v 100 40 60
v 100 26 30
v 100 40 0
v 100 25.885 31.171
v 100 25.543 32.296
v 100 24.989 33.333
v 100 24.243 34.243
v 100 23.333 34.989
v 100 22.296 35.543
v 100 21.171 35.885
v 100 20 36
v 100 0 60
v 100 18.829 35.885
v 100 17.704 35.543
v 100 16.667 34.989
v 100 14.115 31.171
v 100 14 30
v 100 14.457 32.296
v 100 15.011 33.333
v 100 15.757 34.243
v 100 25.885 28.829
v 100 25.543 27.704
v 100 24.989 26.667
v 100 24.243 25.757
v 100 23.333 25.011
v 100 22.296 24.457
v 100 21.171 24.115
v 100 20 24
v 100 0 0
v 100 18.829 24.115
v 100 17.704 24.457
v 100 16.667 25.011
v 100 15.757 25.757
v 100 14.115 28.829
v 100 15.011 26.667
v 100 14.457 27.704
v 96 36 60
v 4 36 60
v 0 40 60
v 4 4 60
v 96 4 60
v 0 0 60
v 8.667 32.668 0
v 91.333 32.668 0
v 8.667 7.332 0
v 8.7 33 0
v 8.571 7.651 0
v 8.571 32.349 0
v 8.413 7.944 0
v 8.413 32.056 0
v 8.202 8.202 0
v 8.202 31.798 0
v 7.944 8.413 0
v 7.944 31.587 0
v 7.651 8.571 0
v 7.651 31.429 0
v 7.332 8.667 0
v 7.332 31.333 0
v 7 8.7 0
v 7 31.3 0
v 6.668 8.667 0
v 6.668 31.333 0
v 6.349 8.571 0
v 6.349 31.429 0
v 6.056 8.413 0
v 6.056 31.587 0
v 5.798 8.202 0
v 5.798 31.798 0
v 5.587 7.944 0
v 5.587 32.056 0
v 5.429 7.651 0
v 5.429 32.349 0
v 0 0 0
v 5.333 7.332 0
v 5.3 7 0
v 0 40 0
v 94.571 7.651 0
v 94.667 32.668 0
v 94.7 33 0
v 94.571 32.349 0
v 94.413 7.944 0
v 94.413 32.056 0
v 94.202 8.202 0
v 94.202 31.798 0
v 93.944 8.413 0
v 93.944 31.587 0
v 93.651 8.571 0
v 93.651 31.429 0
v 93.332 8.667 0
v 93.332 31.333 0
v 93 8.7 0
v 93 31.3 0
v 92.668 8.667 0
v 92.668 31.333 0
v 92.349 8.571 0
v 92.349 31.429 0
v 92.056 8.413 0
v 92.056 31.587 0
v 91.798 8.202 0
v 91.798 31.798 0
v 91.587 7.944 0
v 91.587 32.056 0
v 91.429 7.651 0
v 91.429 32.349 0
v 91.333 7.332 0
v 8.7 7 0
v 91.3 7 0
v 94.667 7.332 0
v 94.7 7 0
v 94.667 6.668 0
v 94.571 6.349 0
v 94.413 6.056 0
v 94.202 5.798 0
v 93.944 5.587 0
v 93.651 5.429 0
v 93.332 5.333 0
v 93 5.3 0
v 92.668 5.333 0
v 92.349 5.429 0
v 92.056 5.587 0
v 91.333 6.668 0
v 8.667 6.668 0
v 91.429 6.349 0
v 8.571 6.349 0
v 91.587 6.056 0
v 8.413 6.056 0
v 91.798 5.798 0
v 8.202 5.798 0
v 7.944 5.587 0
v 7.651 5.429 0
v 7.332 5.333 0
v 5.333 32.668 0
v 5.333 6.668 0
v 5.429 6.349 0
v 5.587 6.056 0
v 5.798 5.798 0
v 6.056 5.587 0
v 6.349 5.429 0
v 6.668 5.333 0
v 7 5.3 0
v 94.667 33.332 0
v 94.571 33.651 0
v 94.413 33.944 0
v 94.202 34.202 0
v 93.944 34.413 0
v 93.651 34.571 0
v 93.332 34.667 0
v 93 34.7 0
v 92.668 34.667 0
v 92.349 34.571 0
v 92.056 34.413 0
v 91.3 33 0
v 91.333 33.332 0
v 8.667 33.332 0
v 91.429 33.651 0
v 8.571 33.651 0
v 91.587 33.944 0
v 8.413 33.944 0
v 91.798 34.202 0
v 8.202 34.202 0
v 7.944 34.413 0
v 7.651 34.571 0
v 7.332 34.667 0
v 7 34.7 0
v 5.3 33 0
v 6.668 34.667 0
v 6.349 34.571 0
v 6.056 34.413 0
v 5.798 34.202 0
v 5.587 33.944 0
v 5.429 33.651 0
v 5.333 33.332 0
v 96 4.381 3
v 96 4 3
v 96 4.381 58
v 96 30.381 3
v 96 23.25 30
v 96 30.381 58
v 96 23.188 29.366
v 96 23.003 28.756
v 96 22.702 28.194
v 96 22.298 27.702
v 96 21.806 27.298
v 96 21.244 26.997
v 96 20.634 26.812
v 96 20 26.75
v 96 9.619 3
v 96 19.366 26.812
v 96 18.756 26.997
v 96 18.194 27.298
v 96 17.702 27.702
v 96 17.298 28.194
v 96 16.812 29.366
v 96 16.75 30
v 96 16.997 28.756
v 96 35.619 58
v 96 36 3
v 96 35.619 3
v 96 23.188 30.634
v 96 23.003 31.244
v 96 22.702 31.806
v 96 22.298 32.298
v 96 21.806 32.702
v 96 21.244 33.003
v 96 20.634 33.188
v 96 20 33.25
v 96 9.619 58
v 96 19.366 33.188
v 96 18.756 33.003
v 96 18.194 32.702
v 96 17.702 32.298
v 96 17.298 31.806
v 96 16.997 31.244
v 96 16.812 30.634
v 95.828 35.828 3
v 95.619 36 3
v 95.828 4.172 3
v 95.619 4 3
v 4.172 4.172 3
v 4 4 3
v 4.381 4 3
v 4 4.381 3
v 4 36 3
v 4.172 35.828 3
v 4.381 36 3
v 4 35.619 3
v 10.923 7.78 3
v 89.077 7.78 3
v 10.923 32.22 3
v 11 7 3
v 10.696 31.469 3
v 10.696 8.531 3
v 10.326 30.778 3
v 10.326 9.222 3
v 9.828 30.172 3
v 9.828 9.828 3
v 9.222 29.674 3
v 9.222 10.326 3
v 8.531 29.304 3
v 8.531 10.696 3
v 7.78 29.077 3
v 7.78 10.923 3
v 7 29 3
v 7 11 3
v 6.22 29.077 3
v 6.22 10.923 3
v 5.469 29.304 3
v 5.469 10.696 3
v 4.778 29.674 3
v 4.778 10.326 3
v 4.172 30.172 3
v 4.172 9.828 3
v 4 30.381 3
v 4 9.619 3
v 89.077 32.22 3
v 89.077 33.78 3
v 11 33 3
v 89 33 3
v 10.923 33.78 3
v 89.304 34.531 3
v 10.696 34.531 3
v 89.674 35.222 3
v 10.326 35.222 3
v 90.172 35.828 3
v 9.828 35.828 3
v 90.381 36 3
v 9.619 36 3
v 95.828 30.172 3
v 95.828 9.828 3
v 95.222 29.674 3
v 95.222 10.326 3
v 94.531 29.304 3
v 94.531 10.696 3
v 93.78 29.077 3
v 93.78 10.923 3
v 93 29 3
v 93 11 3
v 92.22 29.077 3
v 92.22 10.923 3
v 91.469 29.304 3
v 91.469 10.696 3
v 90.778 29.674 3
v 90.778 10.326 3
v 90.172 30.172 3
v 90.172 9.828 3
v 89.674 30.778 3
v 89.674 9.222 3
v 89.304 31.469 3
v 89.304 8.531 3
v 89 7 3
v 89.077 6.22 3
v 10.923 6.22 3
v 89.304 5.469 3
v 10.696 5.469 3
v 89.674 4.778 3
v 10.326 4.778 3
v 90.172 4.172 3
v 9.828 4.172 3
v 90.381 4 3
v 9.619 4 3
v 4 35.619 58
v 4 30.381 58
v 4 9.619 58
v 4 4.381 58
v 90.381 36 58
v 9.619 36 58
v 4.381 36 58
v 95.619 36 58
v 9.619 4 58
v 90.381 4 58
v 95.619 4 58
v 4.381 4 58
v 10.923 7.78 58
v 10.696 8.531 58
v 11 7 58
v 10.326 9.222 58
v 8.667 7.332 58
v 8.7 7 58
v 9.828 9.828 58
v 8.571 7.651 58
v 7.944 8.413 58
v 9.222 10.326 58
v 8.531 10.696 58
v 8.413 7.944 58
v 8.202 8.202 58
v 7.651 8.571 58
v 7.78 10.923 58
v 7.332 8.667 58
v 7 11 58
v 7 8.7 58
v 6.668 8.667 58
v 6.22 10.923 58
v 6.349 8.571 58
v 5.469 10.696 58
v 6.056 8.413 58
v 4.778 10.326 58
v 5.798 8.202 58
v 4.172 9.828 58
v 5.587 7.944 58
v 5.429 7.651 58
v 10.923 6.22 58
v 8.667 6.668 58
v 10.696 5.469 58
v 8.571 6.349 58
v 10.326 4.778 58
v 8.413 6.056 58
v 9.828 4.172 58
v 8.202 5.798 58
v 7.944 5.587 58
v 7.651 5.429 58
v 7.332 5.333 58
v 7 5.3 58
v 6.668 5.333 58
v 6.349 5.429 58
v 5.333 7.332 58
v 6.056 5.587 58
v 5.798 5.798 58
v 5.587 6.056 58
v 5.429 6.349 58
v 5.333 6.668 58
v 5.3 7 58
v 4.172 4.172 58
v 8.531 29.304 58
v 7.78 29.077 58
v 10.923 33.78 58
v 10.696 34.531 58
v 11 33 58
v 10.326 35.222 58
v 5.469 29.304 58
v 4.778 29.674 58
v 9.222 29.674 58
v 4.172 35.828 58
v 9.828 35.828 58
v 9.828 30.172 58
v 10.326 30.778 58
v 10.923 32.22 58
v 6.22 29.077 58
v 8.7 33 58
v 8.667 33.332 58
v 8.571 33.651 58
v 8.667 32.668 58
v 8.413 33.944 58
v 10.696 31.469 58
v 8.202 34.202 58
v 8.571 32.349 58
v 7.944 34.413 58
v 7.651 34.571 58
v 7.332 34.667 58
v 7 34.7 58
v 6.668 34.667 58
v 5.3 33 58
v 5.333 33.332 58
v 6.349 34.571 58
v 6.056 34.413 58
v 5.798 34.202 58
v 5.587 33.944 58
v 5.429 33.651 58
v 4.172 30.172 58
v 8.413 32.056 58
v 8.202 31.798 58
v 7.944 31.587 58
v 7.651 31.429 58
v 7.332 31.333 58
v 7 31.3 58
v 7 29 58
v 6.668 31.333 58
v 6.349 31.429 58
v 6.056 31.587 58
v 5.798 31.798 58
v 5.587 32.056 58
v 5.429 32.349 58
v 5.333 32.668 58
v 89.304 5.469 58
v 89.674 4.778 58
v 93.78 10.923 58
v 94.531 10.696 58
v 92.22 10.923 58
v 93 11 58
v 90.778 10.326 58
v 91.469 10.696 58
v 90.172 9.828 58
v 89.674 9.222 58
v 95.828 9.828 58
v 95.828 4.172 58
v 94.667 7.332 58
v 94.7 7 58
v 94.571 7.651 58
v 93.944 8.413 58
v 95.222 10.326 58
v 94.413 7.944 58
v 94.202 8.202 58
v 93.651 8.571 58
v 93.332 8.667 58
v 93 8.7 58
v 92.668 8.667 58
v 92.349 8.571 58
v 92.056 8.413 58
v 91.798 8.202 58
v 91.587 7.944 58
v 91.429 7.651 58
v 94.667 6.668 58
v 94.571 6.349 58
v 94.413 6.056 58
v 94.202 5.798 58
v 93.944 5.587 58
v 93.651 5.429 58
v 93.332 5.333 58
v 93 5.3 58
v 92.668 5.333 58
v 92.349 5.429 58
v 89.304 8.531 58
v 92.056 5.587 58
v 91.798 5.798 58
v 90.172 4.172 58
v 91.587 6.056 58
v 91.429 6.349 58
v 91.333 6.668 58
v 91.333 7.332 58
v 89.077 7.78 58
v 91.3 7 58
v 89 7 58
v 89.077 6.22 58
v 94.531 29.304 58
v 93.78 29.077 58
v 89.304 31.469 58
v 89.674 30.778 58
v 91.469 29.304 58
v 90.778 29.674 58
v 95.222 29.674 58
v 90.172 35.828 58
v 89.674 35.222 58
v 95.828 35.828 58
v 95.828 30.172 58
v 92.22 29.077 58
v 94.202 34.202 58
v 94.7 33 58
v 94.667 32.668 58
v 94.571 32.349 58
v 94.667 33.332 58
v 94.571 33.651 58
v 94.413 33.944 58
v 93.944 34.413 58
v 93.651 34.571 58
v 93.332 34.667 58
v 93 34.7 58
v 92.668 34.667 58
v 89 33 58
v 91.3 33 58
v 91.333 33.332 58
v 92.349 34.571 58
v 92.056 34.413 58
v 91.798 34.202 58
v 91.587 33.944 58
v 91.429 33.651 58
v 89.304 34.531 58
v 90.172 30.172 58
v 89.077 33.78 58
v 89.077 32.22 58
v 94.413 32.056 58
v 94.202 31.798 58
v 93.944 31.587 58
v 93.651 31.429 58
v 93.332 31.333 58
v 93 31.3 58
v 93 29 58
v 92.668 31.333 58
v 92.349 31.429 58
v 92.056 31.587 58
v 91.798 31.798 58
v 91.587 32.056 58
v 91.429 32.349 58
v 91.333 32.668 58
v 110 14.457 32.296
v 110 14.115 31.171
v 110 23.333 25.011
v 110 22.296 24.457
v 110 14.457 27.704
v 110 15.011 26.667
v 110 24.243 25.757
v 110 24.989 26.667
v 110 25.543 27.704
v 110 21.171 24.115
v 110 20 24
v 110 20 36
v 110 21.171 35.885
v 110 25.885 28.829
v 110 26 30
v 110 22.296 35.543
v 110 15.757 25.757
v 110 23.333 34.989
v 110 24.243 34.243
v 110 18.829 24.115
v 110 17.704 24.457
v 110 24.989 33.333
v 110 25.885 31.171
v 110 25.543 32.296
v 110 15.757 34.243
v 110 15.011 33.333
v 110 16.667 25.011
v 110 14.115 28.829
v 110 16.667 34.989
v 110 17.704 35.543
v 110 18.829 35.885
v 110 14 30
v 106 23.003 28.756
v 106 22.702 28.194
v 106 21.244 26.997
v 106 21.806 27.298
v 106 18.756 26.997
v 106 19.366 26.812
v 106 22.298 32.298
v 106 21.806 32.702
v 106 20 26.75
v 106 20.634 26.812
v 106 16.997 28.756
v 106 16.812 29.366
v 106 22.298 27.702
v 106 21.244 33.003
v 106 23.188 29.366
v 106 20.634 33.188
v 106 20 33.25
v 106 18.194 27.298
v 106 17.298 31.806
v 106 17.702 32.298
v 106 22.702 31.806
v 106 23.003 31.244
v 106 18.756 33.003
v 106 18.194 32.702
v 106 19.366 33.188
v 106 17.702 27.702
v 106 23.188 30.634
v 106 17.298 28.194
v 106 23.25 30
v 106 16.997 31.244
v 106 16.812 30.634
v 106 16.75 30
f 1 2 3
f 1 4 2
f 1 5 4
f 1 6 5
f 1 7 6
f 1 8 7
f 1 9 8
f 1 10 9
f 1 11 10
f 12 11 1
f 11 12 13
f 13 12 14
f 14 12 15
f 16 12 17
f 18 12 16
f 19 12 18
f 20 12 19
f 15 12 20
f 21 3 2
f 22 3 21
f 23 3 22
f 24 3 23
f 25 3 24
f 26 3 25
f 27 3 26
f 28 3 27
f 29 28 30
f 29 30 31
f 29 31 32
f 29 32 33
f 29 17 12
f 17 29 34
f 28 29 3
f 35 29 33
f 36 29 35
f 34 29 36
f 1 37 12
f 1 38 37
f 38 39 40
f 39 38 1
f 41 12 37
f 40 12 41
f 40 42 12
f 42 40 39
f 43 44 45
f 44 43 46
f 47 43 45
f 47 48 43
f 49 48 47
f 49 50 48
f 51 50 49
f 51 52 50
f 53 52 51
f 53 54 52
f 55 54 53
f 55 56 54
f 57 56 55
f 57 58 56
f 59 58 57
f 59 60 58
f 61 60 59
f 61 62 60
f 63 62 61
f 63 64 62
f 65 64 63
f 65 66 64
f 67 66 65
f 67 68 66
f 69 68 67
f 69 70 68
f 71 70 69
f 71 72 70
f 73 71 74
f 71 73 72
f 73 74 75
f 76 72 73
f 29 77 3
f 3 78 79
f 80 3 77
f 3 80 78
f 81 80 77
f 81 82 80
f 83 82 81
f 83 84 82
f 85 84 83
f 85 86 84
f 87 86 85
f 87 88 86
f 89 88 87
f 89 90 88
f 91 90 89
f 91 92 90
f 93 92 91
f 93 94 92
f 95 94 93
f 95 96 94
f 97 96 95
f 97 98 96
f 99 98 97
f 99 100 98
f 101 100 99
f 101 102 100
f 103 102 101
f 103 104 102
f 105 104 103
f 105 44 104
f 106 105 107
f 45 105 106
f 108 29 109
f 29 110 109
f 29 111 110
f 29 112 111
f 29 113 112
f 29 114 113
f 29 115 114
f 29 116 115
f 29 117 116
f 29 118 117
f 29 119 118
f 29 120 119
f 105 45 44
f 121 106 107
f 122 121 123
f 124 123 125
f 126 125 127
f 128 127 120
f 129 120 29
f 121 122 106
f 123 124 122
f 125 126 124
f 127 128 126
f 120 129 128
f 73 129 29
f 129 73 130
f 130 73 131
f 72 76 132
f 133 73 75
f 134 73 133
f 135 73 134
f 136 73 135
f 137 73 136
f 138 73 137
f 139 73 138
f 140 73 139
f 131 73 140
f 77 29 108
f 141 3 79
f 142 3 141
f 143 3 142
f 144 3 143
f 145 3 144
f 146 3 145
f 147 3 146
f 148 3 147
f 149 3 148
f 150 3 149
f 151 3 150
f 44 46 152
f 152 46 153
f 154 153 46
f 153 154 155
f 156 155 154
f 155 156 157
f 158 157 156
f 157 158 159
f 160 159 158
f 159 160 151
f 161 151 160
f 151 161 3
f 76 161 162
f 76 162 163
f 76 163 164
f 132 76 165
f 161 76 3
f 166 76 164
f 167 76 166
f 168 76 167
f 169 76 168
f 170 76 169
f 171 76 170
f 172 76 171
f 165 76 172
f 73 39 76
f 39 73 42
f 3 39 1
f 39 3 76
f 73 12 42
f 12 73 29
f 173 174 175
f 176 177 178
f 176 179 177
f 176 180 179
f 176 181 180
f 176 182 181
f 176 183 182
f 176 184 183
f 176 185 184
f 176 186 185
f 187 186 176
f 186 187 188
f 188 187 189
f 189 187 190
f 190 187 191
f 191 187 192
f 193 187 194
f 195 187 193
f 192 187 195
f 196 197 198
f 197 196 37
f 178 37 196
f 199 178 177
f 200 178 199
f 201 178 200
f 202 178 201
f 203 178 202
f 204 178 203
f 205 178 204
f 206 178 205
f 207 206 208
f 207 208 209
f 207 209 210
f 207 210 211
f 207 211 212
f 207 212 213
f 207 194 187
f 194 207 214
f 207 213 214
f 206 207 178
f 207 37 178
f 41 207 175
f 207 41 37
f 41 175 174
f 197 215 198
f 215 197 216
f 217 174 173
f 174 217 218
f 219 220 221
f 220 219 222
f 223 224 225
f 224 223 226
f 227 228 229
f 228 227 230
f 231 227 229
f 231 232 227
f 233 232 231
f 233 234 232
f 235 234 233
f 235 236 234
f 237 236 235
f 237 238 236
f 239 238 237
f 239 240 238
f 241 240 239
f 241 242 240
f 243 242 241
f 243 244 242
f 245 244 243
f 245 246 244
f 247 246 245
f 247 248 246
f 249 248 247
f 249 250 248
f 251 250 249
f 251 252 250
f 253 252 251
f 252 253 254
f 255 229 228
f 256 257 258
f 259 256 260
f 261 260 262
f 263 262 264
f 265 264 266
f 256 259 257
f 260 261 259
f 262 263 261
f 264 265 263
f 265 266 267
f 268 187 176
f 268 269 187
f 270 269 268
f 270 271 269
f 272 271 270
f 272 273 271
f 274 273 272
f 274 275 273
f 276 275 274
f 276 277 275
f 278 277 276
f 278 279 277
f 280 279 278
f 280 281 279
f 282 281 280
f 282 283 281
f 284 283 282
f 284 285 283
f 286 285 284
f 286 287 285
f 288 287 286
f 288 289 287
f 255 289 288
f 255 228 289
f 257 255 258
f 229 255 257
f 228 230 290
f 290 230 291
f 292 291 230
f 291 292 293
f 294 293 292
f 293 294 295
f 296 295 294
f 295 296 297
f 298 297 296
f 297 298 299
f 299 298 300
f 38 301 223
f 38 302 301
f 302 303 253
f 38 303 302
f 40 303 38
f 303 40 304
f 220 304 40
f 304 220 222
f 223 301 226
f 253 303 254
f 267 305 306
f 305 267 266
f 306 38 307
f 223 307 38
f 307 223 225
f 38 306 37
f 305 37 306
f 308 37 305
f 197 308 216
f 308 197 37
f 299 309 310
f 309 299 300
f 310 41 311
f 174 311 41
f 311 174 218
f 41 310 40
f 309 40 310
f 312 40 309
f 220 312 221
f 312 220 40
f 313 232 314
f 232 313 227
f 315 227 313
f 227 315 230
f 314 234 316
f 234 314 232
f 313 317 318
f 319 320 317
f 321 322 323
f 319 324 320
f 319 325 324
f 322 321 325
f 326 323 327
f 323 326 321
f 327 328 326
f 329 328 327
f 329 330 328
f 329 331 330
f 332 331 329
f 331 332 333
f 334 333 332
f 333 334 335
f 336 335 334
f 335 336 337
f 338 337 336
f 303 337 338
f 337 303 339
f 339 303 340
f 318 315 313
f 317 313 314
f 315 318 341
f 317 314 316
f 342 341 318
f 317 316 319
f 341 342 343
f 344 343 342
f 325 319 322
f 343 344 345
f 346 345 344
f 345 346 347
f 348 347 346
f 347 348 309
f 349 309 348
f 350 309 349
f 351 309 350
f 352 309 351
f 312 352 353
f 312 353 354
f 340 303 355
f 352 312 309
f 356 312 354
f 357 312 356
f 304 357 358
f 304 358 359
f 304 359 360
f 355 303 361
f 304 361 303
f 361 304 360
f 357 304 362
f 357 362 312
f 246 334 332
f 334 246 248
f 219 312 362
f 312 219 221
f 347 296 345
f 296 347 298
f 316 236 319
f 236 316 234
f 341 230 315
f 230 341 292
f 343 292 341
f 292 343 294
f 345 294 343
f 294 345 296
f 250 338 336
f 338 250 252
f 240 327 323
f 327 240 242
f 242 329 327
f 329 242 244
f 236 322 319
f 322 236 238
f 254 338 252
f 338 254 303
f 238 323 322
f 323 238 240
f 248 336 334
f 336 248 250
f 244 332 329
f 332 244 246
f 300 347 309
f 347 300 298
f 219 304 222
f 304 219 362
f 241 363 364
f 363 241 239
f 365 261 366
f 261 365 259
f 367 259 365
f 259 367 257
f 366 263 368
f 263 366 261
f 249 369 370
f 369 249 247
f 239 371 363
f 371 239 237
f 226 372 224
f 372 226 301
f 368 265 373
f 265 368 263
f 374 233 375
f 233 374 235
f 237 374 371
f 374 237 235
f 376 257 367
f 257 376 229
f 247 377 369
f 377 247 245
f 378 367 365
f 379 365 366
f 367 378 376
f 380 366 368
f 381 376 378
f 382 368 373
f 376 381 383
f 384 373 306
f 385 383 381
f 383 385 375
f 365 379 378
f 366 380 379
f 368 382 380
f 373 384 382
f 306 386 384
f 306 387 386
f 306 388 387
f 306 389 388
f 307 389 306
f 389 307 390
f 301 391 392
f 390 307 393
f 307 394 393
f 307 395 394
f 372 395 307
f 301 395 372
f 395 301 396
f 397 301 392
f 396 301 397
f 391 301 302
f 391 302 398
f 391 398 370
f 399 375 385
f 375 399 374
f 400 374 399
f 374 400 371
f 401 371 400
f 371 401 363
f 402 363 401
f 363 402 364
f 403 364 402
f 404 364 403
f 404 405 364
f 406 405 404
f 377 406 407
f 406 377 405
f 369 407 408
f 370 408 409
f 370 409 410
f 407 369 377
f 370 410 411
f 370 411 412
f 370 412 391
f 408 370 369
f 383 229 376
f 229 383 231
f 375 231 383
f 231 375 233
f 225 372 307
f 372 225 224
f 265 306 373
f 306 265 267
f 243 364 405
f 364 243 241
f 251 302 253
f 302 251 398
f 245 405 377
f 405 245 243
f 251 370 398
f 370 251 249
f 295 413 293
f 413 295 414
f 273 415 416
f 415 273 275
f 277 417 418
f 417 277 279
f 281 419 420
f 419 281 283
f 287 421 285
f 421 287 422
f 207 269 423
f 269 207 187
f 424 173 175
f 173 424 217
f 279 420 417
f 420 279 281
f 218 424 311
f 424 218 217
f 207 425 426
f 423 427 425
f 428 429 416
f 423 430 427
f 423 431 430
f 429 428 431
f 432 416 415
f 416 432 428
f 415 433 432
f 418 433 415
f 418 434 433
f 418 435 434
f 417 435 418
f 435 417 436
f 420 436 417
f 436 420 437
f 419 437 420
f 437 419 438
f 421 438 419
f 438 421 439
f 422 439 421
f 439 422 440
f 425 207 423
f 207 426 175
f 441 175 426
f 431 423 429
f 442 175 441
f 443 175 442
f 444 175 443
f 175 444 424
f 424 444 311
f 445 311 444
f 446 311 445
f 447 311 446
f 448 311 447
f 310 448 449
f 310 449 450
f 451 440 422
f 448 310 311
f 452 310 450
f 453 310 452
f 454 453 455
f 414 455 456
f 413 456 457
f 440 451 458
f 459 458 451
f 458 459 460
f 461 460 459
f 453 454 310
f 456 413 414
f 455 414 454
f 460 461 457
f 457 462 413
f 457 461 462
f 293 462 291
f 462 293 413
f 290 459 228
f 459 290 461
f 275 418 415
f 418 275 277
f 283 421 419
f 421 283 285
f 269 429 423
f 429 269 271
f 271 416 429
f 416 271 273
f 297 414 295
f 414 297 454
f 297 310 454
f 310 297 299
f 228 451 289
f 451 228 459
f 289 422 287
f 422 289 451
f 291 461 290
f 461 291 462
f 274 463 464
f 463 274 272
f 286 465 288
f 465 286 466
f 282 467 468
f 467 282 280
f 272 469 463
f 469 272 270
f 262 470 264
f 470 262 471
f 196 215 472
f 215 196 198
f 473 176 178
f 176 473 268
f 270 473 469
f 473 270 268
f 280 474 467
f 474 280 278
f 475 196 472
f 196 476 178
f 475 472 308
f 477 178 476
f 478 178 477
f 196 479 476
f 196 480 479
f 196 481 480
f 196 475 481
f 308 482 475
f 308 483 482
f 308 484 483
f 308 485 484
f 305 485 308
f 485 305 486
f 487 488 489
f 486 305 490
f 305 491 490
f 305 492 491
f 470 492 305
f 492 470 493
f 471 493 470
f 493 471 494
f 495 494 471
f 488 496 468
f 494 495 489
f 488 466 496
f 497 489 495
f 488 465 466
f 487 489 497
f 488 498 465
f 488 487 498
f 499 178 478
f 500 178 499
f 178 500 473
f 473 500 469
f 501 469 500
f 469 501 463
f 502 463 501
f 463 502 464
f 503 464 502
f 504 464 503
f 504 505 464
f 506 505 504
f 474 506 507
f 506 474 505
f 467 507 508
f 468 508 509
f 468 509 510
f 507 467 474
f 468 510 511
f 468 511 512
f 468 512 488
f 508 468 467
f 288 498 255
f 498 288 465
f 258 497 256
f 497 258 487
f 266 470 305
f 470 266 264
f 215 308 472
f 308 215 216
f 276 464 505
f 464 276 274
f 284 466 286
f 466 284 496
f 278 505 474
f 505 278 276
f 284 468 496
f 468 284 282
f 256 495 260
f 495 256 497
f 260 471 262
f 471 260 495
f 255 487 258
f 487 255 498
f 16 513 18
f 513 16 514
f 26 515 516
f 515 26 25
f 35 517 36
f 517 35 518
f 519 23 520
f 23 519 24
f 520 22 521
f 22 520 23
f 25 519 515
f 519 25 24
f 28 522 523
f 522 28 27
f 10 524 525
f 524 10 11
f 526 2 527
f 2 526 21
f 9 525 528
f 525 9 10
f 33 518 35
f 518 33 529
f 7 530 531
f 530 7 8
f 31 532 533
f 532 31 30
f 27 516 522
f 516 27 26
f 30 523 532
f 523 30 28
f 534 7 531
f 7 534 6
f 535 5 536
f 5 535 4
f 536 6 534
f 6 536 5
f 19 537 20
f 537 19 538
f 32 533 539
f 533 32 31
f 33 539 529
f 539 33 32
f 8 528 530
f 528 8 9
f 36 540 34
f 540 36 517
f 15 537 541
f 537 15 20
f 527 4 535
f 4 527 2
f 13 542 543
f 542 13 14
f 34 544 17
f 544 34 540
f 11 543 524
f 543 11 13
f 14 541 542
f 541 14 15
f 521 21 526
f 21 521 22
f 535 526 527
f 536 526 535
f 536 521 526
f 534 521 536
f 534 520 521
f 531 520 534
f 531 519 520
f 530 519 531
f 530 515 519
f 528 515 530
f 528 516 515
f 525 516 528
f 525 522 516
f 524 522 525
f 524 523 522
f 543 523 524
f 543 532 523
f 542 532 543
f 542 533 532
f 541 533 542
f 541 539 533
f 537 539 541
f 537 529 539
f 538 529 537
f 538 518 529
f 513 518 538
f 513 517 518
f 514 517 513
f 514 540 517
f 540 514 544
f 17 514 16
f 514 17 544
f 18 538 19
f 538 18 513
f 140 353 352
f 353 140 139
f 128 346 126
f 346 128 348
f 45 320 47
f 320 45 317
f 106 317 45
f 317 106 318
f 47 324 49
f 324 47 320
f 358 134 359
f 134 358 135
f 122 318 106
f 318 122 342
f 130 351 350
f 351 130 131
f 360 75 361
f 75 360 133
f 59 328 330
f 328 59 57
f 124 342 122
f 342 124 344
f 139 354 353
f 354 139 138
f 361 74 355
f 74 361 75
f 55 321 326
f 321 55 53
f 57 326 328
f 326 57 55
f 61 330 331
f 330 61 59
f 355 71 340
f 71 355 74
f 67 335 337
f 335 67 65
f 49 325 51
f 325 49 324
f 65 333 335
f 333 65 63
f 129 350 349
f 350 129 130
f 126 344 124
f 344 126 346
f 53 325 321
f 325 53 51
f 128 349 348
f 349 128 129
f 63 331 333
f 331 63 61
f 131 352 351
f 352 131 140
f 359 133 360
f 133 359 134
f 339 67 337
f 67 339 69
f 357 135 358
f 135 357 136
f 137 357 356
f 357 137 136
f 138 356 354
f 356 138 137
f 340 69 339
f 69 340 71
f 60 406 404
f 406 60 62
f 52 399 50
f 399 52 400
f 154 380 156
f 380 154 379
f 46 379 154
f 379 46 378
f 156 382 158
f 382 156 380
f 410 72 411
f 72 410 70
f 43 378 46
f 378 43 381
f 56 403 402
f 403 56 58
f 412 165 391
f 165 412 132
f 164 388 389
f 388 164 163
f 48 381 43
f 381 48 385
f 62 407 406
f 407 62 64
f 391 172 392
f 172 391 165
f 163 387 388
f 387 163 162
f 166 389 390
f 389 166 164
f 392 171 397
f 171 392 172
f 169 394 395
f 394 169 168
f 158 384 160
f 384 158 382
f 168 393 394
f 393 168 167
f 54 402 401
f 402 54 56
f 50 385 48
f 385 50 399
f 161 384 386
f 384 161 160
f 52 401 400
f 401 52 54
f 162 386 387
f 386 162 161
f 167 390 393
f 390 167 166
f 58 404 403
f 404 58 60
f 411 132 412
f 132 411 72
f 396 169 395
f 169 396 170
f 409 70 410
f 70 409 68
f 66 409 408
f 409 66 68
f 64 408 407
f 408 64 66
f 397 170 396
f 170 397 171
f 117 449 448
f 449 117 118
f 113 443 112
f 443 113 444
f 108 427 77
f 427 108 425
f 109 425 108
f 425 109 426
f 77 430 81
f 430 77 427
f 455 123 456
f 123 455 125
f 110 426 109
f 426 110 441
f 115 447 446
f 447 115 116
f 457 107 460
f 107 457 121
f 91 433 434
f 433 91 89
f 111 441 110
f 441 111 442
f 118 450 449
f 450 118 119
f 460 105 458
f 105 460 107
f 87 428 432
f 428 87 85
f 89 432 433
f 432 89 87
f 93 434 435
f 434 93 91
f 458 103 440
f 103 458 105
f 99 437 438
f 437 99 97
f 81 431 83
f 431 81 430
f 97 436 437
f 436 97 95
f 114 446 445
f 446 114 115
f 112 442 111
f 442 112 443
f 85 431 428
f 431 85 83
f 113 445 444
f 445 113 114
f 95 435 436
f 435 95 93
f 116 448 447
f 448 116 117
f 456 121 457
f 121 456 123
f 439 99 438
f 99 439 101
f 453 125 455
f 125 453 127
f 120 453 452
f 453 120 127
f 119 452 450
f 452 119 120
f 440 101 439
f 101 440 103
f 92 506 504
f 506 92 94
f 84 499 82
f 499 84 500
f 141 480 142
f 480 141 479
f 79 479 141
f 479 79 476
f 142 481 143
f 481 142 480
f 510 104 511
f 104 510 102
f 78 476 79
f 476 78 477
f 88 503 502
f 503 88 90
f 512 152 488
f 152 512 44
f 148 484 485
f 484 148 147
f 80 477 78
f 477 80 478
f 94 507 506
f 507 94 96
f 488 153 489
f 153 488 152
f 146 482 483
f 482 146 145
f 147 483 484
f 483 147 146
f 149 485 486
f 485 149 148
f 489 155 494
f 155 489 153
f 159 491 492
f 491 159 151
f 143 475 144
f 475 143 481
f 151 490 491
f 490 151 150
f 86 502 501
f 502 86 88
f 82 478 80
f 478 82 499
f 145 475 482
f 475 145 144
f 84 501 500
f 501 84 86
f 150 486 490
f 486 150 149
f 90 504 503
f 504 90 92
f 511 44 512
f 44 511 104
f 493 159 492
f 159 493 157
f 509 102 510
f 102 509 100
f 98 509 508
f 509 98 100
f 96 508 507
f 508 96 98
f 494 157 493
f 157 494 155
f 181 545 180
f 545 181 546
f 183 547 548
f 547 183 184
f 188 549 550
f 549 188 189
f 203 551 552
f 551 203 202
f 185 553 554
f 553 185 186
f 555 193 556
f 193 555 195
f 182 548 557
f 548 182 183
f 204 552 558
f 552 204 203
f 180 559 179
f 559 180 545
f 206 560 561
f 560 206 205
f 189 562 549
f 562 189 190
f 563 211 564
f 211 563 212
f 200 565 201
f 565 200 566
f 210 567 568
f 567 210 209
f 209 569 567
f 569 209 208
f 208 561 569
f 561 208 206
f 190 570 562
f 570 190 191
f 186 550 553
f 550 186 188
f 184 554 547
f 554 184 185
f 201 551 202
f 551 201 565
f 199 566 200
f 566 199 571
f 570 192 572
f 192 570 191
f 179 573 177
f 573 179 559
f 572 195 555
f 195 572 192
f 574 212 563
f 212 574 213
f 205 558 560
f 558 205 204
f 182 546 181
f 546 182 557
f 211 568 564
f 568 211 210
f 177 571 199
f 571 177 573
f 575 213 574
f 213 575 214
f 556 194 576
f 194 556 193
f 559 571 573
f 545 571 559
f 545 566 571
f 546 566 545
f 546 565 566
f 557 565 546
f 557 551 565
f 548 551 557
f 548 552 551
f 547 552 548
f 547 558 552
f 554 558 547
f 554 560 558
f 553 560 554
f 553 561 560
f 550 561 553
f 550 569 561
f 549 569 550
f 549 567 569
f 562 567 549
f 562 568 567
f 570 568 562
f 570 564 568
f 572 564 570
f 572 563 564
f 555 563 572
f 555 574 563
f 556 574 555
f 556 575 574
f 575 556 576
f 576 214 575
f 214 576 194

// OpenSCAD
$fn = 32;

// ----------------------------------------------------------------------
// Enclosure body: 100 x 40 x 60 mm, wall 4 mm
// ----------------------------------------------------------------------

// --- parameters (mm) ---
length = 100;             // outside length, X
width = 40;               // outside width, Y
height = 60;              // outside height, Z
wall = 4;                 // side wall thickness
floor_t = 3;              // floor thickness
boss_d = 8;               // corner boss diameter
boss_h = 55;              // corner boss height above the floor
boss_hole_d = 3.4;        // lid screw clearance in the boss
boss_lip = 7;             // boss centre inset from the corner
nipple_d = 12;            // cable gland boss diameter
nipple_h = 10;            // cable gland boss height
nipple_bore = 6.5;        // cable gland bore

module shell() {
  difference() {
    cube([length, width, height]);
    /* hollow, open at the top */
    translate([wall, wall, floor_t])
      cube([length - 2 * wall, width - 2 * wall, height]);
  }
}

module bosses() {
  /* corner bosses, sunk 1 mm into the floor */
  for (sx = [0, 1]) for (sy = [0, 1])
    translate([sx * (length - 2 * boss_lip) + boss_lip, sy * (width - 2 * boss_lip) + boss_lip, floor_t - 1])
      cylinder(h = boss_h + 1, d = boss_d);
}

module gland() {
  /* boss on the short wall, sunk 1 mm into it */
  translate([length - 1, width / 2, height * 0.5]) rotate([0, 90, 0])
    cylinder(h = nipple_h + 1, d = nipple_d);
}

difference() {
  union() {
    shell();
    bosses();
    gland();
  }
  /* boss screw holes */
  for (sx = [0, 1]) for (sy = [0, 1])
    translate([sx * (length - 2 * boss_lip) + boss_lip, sy * (width - 2 * boss_lip) + boss_lip, -1]) cylinder(h = floor_t + boss_h + 2, d = boss_hole_d);
  translate([length, width / 2, height * 0.5]) rotate([0, 90, 0]) translate([0, 0, -nipple_h - 2]) cylinder(h = nipple_h + wall + 4, d = nipple_bore);
}
